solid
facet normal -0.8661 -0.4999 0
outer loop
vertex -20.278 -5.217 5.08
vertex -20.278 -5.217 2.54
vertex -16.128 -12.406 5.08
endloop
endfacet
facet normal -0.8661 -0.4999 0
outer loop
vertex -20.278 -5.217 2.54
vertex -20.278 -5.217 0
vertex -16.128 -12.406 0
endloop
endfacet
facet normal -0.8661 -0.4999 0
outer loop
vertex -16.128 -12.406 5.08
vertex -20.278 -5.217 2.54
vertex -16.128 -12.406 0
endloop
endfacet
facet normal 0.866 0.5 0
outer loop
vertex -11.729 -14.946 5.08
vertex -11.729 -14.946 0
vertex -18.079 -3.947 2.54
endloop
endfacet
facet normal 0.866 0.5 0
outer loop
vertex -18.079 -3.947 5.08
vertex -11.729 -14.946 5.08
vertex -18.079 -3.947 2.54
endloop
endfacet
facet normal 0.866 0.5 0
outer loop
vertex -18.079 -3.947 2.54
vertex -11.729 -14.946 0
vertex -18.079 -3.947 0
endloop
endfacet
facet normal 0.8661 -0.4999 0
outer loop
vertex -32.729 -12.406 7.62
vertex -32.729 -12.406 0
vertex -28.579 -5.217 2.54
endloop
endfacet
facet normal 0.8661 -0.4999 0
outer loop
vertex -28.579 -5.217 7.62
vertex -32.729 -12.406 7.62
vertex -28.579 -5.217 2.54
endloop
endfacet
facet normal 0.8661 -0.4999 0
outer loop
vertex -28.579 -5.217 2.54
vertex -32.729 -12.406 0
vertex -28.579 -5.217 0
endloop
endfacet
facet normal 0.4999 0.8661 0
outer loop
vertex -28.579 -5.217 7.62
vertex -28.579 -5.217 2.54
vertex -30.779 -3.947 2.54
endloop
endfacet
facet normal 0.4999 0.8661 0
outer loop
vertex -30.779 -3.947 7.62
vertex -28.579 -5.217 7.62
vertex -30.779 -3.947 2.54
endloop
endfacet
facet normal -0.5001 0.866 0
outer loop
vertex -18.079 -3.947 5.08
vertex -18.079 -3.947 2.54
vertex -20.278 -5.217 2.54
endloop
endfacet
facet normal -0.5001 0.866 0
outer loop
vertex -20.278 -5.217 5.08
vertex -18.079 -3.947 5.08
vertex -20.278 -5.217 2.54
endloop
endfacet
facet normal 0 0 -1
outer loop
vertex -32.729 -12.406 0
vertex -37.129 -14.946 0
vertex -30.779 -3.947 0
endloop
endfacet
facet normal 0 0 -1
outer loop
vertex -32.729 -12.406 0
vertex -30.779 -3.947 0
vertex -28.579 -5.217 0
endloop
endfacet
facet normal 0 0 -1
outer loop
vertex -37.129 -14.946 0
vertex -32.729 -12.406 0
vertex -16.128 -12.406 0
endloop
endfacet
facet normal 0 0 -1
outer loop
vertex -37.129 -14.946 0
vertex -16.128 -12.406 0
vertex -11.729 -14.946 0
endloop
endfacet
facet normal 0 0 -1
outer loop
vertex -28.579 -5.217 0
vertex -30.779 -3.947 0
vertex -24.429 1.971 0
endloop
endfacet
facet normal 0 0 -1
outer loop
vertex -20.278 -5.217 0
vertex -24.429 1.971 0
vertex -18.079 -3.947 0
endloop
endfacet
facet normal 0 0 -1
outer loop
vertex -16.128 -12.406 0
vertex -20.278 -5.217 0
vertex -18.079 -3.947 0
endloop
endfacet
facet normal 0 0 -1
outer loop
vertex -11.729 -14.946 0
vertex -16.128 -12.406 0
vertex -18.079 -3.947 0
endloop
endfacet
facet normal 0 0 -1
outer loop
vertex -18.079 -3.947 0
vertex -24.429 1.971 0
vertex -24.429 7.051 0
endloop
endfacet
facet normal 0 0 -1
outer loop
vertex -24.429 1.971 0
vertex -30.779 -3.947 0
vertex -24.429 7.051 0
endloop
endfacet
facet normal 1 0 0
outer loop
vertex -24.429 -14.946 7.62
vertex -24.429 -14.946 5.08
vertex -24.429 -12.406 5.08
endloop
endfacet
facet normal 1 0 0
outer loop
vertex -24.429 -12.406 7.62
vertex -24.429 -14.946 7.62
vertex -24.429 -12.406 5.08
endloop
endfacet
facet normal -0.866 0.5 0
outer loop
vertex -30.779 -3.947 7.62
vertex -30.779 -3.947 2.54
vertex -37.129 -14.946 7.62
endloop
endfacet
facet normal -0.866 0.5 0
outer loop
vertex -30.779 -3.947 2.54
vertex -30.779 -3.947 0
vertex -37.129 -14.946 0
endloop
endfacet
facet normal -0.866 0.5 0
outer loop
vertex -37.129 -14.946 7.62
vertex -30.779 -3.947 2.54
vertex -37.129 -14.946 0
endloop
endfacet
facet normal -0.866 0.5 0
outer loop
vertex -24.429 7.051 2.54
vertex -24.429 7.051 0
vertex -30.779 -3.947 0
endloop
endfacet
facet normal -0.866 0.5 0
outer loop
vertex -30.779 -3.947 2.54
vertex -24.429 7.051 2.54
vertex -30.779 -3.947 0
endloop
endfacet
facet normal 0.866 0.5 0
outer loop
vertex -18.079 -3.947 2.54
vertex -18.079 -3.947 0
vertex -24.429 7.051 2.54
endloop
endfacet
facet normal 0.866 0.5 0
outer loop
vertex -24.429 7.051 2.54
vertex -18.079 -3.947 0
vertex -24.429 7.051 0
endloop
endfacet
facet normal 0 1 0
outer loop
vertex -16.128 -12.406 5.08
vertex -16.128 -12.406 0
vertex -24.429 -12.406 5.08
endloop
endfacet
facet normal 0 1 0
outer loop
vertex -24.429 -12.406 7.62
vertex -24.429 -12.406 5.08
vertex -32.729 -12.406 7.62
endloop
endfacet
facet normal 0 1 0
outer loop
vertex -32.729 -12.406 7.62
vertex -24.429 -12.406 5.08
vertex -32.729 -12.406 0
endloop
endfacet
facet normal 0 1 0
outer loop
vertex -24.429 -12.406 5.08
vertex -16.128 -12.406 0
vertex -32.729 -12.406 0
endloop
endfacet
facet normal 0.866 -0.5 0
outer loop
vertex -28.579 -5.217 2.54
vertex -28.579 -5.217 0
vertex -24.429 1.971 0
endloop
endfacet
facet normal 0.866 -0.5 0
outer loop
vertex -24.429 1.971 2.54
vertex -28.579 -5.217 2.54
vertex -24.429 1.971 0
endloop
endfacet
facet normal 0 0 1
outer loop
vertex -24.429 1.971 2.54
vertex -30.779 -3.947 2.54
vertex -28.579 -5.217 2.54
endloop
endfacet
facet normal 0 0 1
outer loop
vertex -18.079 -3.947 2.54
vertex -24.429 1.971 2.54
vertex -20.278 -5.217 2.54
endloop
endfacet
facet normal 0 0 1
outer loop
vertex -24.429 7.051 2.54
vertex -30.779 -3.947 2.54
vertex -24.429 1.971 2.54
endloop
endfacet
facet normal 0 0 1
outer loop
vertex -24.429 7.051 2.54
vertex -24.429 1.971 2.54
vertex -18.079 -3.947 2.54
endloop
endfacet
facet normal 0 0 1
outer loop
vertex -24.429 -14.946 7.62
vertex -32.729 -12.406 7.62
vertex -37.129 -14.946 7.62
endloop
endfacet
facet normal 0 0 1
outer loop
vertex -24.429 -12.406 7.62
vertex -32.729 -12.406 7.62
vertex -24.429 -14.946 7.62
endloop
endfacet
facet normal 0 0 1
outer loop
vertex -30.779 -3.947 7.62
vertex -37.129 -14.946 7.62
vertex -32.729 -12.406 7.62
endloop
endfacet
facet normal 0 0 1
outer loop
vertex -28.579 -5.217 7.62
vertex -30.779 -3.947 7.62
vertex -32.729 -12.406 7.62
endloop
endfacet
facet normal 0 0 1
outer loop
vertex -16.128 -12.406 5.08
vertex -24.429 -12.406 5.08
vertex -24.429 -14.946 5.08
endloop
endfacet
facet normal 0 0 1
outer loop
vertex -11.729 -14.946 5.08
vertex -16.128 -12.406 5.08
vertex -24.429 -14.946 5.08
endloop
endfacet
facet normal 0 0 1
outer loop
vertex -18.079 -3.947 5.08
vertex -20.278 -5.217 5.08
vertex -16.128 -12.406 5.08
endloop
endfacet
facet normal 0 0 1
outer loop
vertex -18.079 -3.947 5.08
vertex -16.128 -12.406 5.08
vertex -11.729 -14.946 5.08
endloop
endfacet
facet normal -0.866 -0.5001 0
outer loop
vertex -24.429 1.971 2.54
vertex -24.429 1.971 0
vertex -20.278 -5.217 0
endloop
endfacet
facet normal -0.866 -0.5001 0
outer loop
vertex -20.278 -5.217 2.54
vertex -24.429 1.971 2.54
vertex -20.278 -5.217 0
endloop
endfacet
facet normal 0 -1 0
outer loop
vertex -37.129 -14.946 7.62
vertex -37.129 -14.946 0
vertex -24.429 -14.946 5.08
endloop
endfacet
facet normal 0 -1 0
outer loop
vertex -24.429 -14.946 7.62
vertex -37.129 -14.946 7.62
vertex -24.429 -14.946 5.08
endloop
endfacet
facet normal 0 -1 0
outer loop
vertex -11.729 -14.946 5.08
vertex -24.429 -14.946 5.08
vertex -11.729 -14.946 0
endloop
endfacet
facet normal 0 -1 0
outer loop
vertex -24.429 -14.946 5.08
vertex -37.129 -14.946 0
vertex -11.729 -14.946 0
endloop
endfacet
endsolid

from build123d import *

# Parameters (mm, degrees)
F1_DEPTH = 2.54
F2_DEPTH = 5.08
F3_DEPTH = 7.62


with BuildPart() as f1:
    # F0 (on Top) → F1 (new body)
    with BuildSketch(Plane.XY):
        Polygon((-24.428534, 7.051245), (-30.778534, -3.947278), (-28.57883, -5.217278), (-24.428534, 1.971245), (-20.278239, -5.217278), (-18.078534, -3.947278), align=None)
    extrude(amount=F1_DEPTH)

    # F0 (on Top) → F2 (join)
    with BuildSketch(Plane.XY):
        Polygon((-24.428534, -12.4058), (-24.428534, -14.9458), (-11.728534, -14.9458), (-18.078534, -3.947278), (-20.278239, -5.217278), (-16.127943, -12.4058), align=None)
    extrude(amount=F2_DEPTH)

    # F0 (on Top) → F3 (join)
    with BuildSketch(Plane.XY):
        Polygon((-30.778534, -3.947278), (-37.128534, -14.9458), (-24.428534, -14.9458), (-24.428534, -12.4058), (-32.729125, -12.4058), (-28.57883, -5.217278), align=None)
    extrude(amount=F3_DEPTH)


solid = f1.part
